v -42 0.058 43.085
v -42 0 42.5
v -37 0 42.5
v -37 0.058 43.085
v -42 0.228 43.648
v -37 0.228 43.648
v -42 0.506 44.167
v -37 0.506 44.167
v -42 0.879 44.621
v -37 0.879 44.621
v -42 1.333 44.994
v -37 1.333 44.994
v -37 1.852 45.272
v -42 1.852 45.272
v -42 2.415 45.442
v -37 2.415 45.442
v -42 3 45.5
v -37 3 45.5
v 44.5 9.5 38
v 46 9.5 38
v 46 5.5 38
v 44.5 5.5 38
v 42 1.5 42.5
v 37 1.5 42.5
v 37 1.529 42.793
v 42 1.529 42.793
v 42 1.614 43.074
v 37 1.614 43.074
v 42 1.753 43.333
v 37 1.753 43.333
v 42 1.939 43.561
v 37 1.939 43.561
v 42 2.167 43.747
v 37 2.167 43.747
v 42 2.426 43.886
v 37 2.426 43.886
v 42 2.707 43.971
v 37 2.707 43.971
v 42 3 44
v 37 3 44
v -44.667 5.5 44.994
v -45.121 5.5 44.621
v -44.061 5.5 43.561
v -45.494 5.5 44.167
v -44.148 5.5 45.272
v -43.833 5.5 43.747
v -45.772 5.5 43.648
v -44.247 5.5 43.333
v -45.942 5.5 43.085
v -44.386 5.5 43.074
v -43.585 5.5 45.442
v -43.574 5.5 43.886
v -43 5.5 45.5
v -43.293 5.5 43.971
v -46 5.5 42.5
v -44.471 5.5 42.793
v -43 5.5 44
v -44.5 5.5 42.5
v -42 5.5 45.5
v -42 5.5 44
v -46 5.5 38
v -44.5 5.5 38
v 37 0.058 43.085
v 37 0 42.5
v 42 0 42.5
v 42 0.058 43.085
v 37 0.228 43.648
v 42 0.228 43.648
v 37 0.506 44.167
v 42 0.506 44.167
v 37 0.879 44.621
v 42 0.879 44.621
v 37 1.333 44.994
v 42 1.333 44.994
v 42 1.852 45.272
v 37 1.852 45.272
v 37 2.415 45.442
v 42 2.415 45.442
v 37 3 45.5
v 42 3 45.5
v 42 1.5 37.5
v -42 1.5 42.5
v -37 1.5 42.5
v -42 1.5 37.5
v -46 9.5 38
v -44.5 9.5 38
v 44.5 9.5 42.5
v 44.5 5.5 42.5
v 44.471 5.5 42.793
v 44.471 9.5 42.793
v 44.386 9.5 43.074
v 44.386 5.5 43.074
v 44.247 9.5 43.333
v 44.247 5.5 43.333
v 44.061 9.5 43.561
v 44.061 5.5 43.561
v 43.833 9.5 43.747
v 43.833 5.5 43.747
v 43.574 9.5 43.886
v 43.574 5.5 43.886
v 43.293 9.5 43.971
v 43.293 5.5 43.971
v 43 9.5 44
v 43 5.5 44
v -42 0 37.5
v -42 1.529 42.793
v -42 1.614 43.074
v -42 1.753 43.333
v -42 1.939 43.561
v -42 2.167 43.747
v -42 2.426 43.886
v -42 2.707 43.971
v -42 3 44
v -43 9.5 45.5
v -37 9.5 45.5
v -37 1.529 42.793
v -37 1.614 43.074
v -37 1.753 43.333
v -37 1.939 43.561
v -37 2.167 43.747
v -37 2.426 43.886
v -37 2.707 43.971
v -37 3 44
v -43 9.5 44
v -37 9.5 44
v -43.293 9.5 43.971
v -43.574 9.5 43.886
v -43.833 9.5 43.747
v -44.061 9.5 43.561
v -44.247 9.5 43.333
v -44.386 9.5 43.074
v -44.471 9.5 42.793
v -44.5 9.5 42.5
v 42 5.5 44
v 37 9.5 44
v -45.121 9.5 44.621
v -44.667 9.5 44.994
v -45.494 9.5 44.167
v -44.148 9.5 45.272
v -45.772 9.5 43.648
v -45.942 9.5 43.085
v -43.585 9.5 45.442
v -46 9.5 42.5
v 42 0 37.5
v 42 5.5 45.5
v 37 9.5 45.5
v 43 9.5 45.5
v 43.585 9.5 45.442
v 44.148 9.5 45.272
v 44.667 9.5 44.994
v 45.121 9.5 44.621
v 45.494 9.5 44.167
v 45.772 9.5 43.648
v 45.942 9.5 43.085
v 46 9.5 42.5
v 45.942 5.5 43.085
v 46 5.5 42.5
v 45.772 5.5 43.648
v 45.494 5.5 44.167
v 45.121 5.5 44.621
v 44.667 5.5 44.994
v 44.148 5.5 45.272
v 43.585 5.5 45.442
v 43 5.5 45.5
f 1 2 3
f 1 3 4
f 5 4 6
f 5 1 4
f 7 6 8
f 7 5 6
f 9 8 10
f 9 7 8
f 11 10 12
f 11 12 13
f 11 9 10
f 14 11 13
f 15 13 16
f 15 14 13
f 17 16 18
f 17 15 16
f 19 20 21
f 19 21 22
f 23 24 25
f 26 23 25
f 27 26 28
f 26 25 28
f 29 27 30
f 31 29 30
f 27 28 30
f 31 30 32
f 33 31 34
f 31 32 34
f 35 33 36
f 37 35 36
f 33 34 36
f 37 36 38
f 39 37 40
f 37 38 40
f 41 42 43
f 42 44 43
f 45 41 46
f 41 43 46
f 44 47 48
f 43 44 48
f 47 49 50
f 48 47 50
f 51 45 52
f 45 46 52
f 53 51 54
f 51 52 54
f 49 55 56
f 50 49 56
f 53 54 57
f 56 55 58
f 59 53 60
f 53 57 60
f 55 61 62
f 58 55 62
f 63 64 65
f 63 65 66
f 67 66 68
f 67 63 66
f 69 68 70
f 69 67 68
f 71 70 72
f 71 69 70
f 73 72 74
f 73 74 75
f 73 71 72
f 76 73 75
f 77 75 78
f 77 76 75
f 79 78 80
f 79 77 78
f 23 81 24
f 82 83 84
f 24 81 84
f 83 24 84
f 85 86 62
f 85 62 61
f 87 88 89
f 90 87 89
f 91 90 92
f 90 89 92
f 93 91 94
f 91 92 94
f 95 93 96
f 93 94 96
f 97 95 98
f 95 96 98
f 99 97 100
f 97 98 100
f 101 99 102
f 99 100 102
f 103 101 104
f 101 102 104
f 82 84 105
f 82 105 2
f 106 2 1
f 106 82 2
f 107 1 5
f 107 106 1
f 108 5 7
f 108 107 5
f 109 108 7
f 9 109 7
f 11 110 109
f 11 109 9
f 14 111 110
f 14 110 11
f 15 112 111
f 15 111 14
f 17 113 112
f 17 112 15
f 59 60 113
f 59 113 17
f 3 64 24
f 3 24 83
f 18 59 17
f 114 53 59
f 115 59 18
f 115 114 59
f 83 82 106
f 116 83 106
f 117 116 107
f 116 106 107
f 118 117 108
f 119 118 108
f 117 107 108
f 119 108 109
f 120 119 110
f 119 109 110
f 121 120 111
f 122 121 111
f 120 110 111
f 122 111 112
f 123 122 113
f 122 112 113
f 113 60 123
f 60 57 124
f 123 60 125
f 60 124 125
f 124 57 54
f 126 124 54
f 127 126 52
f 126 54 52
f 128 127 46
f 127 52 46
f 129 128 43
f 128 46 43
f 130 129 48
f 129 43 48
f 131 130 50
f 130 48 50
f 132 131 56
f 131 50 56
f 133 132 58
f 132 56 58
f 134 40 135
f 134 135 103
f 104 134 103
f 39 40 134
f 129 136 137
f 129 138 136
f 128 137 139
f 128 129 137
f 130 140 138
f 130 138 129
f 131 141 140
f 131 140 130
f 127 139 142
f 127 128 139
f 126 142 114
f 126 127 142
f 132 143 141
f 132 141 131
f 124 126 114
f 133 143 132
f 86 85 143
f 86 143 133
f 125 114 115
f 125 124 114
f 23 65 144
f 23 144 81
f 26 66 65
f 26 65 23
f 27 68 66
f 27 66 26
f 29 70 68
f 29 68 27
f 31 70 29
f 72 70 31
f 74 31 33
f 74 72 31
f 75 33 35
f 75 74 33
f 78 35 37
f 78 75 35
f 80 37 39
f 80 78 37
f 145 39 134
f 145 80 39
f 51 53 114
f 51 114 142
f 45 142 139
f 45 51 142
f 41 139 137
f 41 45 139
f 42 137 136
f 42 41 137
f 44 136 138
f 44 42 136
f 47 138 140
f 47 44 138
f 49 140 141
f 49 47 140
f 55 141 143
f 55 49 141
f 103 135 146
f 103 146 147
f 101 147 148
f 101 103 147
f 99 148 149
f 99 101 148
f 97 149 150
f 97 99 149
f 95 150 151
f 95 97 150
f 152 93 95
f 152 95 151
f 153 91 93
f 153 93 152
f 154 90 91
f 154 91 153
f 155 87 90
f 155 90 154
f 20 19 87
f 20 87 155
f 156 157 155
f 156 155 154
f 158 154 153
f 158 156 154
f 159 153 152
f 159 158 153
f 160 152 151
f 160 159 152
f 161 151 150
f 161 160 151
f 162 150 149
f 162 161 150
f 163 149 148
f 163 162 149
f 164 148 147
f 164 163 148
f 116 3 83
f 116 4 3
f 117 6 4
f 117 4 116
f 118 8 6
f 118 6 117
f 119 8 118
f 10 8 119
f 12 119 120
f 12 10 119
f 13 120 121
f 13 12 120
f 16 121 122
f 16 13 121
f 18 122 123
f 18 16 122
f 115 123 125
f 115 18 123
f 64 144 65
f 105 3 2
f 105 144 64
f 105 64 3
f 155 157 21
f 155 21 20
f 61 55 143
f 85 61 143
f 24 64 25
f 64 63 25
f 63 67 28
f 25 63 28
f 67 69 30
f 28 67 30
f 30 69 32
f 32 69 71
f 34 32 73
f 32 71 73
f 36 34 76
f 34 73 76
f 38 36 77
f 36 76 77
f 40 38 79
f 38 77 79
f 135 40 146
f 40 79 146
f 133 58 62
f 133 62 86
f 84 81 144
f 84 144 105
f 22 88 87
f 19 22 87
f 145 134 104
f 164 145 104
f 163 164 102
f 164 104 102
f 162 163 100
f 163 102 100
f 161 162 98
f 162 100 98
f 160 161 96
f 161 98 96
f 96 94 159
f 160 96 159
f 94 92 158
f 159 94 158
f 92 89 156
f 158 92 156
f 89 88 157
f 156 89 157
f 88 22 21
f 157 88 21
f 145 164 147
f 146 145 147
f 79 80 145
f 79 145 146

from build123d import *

# Parameters (mm, degrees)
BOSS_EXTRUDE1_DEPTH        = 1.5
SKETCH3_W                  = 5
SKETCH3_H                  = 1.5
BOSS_EXTRUDE2_DEPTH        = 8
BOSS_EXTRUDE3_DEPTH        = 6
BOSS_EXTRUDE3_DEPTH_BACK   = 1.5
SKETCH4_W                  = 1.5
SKETCH4_H                  = 4
BOSS_EXTRUDE3_2_DEPTH      = 6
BOSS_EXTRUDE3_2_DEPTH_BACK = 1.5
SKETCH5_W                  = 2.5
SKETCH5_H                  = 1.5
BOSS_EXTRUDE4_DEPTH        = 4
CONVERT_SOLID2_START       = 5.5
CONVERT_SOLID2_DEPTH       = 4
CONVERT_SOLID2_START_2     = -42
CONVERT_SOLID2_2_DEPTH     = 5
CONVERT_SOLID2_START_3     = 37
CONVERT_SOLID2_3_DEPTH     = 5
CONVERT_SOLID2_4_DEPTH     = 4
CONVERT_SOLID2_5_DEPTH     = 84
CUT_EXTRUDE1_DEPTH         = 10


# Read off the part's stored shape, not the designer's step: Convert-Solid2
with BuildPart() as part:
    # Sketch1 → Boss-Extrude1 (new body)
    with BuildSketch(Plane(origin=(0, 0, 0), x_dir=(1, 0, 0), z_dir=(0, 1, 0))):
        Polygon((-42, -45.5), (-42, -42.5), (-45, -42.5), (-45, 42.5), (45, 42.5), (45, -42.5), (42, -42.5), (42, -45.5), (37, -45.5), (37, -42.5), (-37, -42.5), (-37, -45.5), align=None)
    extrude(amount=BOSS_EXTRUDE1_DEPTH)

    # Sketch3 → Boss-Extrude2 (add)
    with BuildSketch(Plane(origin=(0, 1.5, 0), x_dir=(1, 0, 0), z_dir=(0, 1, 0))):
        with Locations((-39.5, -44.75)):
            Rectangle(SKETCH3_W, SKETCH3_H)
        with Locations((39.5, -44.75)):
            Rectangle(SKETCH3_W, SKETCH3_H)
    extrude(amount=BOSS_EXTRUDE2_DEPTH)



with BuildPart() as body_2:
    # Sketch4 → Boss-Extrude3 (new, two sides: drawn at the far end of the back side and taken through both)
    with BuildSketch(Plane(origin=(0, 0, 44), x_dir=(-1, 0, 0), z_dir=(0, 0, -1)).offset(-BOSS_EXTRUDE3_DEPTH_BACK)):
        with Locations((45.25, 7.5)):
            Rectangle(SKETCH4_W, SKETCH4_H)
    extrude(amount=BOSS_EXTRUDE3_DEPTH + BOSS_EXTRUDE3_DEPTH_BACK)


with BuildPart() as body_3:
    # Sketch4 → Boss-Extrude3 2 (new, two sides: drawn at the far end of the back side and taken through both)
    with BuildSketch(Plane(origin=(0, 0, 44), x_dir=(-1, 0, 0), z_dir=(0, 0, -1)).offset(-BOSS_EXTRUDE3_2_DEPTH_BACK)):
        with Locations((-45.25, 7.5)):
            Rectangle(SKETCH4_W, SKETCH4_H)
    extrude(amount=BOSS_EXTRUDE3_2_DEPTH + BOSS_EXTRUDE3_2_DEPTH_BACK)


with BuildPart() as part_1:
    add(part.part)

    add(body_2.part)  # Boss-Extrude4 merges body 2

    add(body_3.part)  # Boss-Extrude4 merges body 3
    # Sketch5 → Boss-Extrude4 (add)
    with BuildSketch(Plane(origin=(0, 9.5, 0), x_dir=(1, 0, 0), z_dir=(0, 1, 0))):
        with Locations((-43.25, -44.75)):
            Rectangle(SKETCH5_W, SKETCH5_H)
        with Locations((43.25, -44.75)):
            Rectangle(SKETCH5_W, SKETCH5_H)
    extrude(amount=-BOSS_EXTRUDE4_DEPTH)

    # Convert-Solid2 outline → Convert-Solid2 (add)
    with BuildSketch(Plane(origin=(0, 0, 0), x_dir=(1, 0, 0), z_dir=(0, 1, 0)).offset(CONVERT_SOLID2_START)):
        with BuildLine():
            ThreePointArc((44.5, -42.5), (44.060660172, -43.560660172), (43, -44))
            Line((43, -44), (44.5, -44))
            Line((44.5, -44), (44.5, -42.5))
        make_face()
        with BuildLine():
            ThreePointArc((-43, -44), (-44.060660172, -43.560660172), (-44.5, -42.5))
            Line((-44.5, -42.5), (-44.5, -44))
            Line((-44.5, -44), (-43, -44))
        make_face()
    extrude(amount=CONVERT_SOLID2_DEPTH)

    # Convert-Solid2 2 outline → Convert-Solid2 2 (add)
    with BuildSketch(Plane.YZ.offset(CONVERT_SOLID2_START_2)):
        with BuildLine():
            ThreePointArc((1.5, 42.5), (1.939339828, 43.560660172), (3, 44))
            Line((3, 44), (1.5, 44))
            Line((1.5, 44), (1.5, 42.5))
        make_face()
    extrude(amount=CONVERT_SOLID2_2_DEPTH)

    # Convert-Solid2 3 outline → Convert-Solid2 3 (add)
    with BuildSketch(Plane.YZ.offset(CONVERT_SOLID2_START_3)):
        with BuildLine():
            ThreePointArc((1.5, 42.5), (1.939339828, 43.560660172), (3, 44))
            Line((3, 44), (1.5, 44))
            Line((1.5, 44), (1.5, 42.5))
        make_face()
    extrude(amount=CONVERT_SOLID2_3_DEPTH)

    # Convert-Solid2 4 outline → Convert-Solid2 4 (cut)
    with BuildSketch(Plane(origin=(0, 0, 0), x_dir=(1, 0, 0), z_dir=(0, 1, 0)).offset(CONVERT_SOLID2_START)):
        with BuildLine():
            ThreePointArc((46, -42.5), (45.121320344, -44.621320344), (43, -45.5))
            Line((43, -45.5), (46, -45.5))
            Line((46, -45.5), (46, -42.5))
        make_face()
        with BuildLine():
            ThreePointArc((-43, -45.5), (-45.121320344, -44.621320344), (-46, -42.5))
            Line((-46, -42.5), (-46, -45.5))
            Line((-46, -45.5), (-43, -45.5))
        make_face()
    extrude(amount=CONVERT_SOLID2_4_DEPTH, mode=Mode.SUBTRACT)

    # Convert-Solid2 5 outline → Convert-Solid2 5 (cut)
    with BuildSketch(Plane.YZ.offset(CONVERT_SOLID2_START_2)):
        with BuildLine():
            ThreePointArc((0, 42.5), (0.878679656, 44.621320344), (3, 45.5))
            Line((3, 45.5), (0, 45.5))
            Line((0, 45.5), (0, 42.5))
        make_face()
    extrude(amount=CONVERT_SOLID2_5_DEPTH, mode=Mode.SUBTRACT)

    # Sketch6 → Cut-Extrude1 (cut)
    with BuildSketch(Plane(origin=(0, 1.5, 0), x_dir=(1, 0, 0), z_dir=(0, 1, 0))):
        Polygon((-45, 42.5), (45, 42.5), (45, -37.5), (45, -42.5), (42, -42.5), (42, -37.5), (-42, -37.5), (-42, -42.5), (-45, -42.5), (-45, -37.5), align=None)
    extrude(amount=-CUT_EXTRUDE1_DEPTH, mode=Mode.SUBTRACT)


solid = part_1.part
